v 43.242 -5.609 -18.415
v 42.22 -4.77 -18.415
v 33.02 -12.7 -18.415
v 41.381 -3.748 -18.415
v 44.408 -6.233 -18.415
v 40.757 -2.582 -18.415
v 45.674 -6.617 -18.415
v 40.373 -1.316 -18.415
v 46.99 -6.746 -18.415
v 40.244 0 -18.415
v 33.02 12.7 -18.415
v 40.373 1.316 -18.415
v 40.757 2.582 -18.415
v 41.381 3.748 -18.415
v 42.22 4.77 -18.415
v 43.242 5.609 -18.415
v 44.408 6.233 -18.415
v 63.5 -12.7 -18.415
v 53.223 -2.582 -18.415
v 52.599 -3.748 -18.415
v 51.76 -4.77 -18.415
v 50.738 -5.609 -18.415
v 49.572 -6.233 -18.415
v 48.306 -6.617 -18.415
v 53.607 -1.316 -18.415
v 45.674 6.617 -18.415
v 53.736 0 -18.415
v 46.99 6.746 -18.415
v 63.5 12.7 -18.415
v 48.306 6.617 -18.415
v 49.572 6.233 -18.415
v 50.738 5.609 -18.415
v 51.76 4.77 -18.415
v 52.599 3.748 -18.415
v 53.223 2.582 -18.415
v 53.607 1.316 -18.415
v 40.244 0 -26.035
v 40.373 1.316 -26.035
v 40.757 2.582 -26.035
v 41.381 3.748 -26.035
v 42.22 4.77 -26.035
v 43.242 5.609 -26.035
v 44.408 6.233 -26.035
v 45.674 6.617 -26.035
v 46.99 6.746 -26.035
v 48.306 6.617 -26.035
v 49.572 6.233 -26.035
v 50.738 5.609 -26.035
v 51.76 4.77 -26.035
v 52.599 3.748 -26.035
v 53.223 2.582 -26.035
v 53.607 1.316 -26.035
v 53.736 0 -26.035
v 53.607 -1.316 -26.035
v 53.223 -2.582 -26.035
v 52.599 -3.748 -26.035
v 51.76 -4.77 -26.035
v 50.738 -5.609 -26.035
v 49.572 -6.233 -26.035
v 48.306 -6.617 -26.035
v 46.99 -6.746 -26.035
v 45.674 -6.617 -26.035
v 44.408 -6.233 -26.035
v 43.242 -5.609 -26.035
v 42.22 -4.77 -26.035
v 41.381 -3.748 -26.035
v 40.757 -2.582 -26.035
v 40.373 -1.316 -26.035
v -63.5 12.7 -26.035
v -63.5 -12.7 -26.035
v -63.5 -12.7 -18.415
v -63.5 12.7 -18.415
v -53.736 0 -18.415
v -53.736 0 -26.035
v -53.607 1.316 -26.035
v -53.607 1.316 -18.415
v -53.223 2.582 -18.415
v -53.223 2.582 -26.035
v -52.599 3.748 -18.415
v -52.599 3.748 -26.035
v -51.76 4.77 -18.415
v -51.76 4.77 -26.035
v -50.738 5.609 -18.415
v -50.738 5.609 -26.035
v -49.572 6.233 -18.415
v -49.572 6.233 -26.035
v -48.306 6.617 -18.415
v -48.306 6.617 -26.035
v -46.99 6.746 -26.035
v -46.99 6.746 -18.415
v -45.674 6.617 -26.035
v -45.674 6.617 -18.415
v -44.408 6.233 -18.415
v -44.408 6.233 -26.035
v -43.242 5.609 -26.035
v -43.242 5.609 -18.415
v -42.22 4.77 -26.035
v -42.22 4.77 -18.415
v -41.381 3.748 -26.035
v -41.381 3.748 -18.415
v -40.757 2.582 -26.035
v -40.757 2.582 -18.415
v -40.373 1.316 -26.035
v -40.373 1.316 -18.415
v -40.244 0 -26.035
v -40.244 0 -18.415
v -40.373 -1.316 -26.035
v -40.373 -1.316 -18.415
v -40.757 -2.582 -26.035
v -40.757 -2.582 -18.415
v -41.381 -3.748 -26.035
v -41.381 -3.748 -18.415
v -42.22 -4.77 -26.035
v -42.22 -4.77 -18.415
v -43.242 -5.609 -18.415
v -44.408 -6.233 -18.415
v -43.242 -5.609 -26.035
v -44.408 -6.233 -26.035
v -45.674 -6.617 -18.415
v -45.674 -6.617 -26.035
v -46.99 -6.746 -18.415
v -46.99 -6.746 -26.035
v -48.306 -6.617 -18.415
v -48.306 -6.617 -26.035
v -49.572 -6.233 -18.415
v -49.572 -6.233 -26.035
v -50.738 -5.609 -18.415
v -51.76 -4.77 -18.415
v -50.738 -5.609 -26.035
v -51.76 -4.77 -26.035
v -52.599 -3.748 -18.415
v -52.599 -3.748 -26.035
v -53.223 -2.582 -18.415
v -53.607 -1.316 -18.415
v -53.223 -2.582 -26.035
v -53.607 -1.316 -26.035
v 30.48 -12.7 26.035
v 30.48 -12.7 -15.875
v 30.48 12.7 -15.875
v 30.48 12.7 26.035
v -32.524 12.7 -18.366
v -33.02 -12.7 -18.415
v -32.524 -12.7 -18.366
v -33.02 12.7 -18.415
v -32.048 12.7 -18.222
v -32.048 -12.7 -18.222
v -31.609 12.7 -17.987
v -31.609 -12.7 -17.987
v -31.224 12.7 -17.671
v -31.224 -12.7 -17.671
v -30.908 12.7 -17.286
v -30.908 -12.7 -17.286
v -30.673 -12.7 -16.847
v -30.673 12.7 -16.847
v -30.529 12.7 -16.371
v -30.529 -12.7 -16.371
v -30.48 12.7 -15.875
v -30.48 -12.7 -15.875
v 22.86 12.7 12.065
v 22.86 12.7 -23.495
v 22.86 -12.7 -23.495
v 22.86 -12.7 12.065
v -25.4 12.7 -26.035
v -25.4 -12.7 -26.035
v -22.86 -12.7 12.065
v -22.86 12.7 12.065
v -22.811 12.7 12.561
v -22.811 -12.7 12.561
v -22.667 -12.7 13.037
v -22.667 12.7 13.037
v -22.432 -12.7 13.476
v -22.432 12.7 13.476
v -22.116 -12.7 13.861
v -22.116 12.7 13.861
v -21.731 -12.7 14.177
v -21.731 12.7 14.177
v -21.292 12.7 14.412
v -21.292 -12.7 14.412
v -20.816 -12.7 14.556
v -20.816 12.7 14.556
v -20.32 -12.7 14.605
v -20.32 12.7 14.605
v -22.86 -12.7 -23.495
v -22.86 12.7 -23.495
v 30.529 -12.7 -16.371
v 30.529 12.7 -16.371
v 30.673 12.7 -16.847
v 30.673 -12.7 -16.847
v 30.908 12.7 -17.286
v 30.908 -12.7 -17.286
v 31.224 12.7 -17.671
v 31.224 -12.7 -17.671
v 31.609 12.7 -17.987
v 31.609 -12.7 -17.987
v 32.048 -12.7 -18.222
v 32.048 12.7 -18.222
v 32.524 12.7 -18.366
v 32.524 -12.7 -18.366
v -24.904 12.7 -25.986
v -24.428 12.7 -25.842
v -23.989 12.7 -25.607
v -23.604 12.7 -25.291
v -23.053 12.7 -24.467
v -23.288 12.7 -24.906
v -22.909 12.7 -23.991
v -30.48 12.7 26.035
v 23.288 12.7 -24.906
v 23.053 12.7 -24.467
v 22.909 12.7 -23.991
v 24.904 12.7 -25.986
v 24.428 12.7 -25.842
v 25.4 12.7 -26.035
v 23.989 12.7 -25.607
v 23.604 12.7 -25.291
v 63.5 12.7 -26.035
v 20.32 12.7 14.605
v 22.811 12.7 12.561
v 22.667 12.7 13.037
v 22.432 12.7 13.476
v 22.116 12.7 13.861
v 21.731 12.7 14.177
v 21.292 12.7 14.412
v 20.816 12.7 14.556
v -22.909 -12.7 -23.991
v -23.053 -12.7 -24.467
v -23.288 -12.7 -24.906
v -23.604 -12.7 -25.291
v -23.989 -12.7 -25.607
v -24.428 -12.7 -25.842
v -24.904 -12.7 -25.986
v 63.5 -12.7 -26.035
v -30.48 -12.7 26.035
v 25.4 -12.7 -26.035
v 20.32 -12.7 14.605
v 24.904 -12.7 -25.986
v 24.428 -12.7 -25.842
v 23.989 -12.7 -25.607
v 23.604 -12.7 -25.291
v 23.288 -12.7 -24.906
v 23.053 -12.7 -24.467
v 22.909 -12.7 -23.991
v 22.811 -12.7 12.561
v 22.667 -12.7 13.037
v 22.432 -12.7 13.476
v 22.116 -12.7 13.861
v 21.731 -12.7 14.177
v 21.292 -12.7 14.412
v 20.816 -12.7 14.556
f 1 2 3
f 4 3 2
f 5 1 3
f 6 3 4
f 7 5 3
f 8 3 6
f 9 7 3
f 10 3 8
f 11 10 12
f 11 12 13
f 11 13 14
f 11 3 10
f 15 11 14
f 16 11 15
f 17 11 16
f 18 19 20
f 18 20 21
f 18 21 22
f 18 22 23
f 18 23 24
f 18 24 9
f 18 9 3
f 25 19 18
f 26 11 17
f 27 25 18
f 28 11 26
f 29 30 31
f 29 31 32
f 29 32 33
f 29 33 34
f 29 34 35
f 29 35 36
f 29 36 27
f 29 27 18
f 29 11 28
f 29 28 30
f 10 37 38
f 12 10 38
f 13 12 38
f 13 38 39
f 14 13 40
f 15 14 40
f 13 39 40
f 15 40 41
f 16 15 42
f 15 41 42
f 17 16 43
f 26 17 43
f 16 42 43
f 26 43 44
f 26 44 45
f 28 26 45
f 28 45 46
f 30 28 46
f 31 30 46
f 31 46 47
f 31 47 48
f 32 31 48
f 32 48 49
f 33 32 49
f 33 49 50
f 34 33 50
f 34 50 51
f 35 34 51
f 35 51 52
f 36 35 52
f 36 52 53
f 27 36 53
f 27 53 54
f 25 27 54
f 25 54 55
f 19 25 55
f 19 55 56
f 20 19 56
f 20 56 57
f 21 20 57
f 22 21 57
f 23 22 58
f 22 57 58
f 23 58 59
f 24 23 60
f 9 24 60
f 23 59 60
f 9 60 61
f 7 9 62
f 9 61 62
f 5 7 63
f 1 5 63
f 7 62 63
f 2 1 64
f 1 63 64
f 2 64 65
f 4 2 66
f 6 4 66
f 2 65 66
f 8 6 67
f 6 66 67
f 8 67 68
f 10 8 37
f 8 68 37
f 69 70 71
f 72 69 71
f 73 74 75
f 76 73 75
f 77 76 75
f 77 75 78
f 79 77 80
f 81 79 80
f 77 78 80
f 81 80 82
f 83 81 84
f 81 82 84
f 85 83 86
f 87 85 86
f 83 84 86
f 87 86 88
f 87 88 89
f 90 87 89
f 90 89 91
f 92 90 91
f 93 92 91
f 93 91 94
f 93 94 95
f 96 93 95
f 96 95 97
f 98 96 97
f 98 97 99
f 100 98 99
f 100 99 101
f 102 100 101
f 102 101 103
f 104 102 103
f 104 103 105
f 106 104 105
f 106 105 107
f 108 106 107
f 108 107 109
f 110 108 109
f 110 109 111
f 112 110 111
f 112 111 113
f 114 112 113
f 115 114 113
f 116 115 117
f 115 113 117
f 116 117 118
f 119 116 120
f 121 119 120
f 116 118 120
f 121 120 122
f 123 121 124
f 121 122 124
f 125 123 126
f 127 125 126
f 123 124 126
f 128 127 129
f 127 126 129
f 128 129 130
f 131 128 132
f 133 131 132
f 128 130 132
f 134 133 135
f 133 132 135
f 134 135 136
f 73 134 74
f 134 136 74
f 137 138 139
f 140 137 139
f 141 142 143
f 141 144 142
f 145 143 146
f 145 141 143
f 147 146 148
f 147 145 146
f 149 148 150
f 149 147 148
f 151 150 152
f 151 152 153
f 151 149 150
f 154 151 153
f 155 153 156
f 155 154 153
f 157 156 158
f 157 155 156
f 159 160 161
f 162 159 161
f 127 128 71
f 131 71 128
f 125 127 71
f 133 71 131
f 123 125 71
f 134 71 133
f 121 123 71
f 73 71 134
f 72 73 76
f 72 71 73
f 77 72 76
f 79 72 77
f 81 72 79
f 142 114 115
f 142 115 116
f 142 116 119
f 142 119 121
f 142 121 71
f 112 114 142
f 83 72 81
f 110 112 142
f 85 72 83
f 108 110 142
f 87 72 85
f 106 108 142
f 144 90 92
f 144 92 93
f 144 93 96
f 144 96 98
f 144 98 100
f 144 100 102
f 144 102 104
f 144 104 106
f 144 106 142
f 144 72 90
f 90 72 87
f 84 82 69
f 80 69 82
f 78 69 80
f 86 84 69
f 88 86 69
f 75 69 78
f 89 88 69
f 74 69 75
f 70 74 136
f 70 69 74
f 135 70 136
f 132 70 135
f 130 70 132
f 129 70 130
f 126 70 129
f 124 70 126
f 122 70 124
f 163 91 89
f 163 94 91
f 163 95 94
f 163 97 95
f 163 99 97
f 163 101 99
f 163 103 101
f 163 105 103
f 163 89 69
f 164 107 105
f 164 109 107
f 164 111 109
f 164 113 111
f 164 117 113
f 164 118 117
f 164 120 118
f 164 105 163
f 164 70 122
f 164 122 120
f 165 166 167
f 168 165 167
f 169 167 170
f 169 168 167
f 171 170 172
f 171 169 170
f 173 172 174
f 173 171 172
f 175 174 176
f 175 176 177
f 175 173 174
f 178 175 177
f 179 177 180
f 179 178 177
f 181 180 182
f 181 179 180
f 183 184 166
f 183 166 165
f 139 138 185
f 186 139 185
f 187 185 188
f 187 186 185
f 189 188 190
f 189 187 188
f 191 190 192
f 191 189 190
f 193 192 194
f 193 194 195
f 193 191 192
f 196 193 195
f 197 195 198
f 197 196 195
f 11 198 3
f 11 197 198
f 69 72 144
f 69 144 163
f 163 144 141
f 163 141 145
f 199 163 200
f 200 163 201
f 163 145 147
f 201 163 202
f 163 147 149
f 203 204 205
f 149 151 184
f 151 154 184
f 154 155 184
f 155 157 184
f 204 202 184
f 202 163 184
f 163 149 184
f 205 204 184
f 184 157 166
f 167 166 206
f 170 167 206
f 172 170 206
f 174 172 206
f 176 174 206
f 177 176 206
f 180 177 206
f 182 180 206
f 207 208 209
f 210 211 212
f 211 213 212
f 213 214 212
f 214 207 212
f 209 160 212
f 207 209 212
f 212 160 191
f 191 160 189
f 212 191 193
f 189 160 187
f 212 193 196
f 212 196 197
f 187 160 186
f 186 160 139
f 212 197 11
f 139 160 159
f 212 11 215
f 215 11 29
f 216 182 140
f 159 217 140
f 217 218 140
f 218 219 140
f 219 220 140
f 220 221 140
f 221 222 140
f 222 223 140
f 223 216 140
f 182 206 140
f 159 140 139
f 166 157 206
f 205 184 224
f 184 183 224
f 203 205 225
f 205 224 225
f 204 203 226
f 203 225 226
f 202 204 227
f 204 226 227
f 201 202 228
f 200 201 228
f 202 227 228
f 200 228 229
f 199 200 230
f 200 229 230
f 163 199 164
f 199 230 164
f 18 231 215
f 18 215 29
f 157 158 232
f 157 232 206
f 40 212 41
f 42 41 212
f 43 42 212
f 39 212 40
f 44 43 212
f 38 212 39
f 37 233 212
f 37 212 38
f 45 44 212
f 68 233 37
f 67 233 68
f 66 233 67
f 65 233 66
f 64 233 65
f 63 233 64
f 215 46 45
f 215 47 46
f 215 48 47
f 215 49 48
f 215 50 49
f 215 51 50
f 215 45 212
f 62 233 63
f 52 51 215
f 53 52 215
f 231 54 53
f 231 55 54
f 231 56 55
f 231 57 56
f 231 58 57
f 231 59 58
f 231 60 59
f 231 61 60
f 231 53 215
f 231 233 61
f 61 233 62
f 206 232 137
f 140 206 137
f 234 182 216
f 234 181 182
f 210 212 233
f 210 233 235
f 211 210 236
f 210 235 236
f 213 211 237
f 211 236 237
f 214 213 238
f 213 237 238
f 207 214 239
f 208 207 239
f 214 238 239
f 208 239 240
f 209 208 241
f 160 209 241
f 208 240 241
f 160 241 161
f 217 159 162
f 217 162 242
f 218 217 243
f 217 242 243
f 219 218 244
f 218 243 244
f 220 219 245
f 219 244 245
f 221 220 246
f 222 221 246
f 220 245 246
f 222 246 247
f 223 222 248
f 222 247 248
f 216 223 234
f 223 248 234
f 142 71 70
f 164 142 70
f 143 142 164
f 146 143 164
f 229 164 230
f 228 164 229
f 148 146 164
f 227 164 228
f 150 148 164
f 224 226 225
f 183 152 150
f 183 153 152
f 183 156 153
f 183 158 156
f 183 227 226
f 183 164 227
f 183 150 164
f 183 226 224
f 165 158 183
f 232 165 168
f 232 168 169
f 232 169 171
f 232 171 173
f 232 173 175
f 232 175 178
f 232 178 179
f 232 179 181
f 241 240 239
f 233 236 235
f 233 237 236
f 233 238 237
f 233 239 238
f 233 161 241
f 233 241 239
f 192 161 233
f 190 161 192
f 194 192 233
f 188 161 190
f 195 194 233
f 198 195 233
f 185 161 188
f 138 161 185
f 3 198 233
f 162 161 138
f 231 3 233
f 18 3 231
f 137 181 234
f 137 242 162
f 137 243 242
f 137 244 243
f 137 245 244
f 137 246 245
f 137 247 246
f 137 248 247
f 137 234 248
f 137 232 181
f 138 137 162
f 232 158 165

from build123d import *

# Parameters (mm, degrees)
F0_W     = 127
F0_H     = 52.07
F1_DEPTH = 12.7
F2_W     = 45.72
F2_H     = 25.4
F3_DEPTH = 40.64
F4_R     = 2.54
F5_W     = 33.02
F5_H     = 25.4
F6_DEPTH = 44.45
F7_R     = 2.54
F8_D     = 13.49248


with BuildPart() as f1:
    # F0 (on Front) → F1 (new body, symmetric)
    with BuildSketch(Plane.XZ):
        Rectangle(F0_W, F0_H)
    extrude(amount=F1_DEPTH, both=True)

    # F2 (on face) → F3 (cut)
    with BuildSketch(Plane(origin=(0, 0, -26.035), x_dir=(1, 0, 0), z_dir=(0, 0, -1))):
        Rectangle(F2_W, F2_H)
    extrude(amount=-F3_DEPTH, mode=Mode.SUBTRACT)

    # F4
    f4_edges = [f1.edges().sort_by_distance(p)[0] for p in [
        (-22.86, 0, 14.605),
        (22.86, 0, 14.605),
    ]]
    fillet(f4_edges, radius=F4_R)

    # F5 (on face) → F6 (cut)
    with BuildSketch(Plane.XY.offset(26.035)):
        with Locations((-46.99, 0)):
            Rectangle(F5_W, F5_H)
        with Locations((46.99, 0)):
            Rectangle(F5_W, F5_H)
    extrude(amount=-F6_DEPTH, mode=Mode.SUBTRACT)

    # F7
    f7_edges = [f1.edges().sort_by_distance(p)[0] for p in [
        (-30.48, 0, -18.415),
        (30.48, 0, -18.415),
        (-22.86, 0, -26.035),
        (22.86, 0, -26.035),
    ]]
    fillet(f7_edges, radius=F7_R)

    # F8 (through all)
    with Locations(Plane.XY.offset(26.035)):
        with Locations((-46.99, 0), (46.99, 0)):
            Hole(F8_D / 2)


solid = f1.part
